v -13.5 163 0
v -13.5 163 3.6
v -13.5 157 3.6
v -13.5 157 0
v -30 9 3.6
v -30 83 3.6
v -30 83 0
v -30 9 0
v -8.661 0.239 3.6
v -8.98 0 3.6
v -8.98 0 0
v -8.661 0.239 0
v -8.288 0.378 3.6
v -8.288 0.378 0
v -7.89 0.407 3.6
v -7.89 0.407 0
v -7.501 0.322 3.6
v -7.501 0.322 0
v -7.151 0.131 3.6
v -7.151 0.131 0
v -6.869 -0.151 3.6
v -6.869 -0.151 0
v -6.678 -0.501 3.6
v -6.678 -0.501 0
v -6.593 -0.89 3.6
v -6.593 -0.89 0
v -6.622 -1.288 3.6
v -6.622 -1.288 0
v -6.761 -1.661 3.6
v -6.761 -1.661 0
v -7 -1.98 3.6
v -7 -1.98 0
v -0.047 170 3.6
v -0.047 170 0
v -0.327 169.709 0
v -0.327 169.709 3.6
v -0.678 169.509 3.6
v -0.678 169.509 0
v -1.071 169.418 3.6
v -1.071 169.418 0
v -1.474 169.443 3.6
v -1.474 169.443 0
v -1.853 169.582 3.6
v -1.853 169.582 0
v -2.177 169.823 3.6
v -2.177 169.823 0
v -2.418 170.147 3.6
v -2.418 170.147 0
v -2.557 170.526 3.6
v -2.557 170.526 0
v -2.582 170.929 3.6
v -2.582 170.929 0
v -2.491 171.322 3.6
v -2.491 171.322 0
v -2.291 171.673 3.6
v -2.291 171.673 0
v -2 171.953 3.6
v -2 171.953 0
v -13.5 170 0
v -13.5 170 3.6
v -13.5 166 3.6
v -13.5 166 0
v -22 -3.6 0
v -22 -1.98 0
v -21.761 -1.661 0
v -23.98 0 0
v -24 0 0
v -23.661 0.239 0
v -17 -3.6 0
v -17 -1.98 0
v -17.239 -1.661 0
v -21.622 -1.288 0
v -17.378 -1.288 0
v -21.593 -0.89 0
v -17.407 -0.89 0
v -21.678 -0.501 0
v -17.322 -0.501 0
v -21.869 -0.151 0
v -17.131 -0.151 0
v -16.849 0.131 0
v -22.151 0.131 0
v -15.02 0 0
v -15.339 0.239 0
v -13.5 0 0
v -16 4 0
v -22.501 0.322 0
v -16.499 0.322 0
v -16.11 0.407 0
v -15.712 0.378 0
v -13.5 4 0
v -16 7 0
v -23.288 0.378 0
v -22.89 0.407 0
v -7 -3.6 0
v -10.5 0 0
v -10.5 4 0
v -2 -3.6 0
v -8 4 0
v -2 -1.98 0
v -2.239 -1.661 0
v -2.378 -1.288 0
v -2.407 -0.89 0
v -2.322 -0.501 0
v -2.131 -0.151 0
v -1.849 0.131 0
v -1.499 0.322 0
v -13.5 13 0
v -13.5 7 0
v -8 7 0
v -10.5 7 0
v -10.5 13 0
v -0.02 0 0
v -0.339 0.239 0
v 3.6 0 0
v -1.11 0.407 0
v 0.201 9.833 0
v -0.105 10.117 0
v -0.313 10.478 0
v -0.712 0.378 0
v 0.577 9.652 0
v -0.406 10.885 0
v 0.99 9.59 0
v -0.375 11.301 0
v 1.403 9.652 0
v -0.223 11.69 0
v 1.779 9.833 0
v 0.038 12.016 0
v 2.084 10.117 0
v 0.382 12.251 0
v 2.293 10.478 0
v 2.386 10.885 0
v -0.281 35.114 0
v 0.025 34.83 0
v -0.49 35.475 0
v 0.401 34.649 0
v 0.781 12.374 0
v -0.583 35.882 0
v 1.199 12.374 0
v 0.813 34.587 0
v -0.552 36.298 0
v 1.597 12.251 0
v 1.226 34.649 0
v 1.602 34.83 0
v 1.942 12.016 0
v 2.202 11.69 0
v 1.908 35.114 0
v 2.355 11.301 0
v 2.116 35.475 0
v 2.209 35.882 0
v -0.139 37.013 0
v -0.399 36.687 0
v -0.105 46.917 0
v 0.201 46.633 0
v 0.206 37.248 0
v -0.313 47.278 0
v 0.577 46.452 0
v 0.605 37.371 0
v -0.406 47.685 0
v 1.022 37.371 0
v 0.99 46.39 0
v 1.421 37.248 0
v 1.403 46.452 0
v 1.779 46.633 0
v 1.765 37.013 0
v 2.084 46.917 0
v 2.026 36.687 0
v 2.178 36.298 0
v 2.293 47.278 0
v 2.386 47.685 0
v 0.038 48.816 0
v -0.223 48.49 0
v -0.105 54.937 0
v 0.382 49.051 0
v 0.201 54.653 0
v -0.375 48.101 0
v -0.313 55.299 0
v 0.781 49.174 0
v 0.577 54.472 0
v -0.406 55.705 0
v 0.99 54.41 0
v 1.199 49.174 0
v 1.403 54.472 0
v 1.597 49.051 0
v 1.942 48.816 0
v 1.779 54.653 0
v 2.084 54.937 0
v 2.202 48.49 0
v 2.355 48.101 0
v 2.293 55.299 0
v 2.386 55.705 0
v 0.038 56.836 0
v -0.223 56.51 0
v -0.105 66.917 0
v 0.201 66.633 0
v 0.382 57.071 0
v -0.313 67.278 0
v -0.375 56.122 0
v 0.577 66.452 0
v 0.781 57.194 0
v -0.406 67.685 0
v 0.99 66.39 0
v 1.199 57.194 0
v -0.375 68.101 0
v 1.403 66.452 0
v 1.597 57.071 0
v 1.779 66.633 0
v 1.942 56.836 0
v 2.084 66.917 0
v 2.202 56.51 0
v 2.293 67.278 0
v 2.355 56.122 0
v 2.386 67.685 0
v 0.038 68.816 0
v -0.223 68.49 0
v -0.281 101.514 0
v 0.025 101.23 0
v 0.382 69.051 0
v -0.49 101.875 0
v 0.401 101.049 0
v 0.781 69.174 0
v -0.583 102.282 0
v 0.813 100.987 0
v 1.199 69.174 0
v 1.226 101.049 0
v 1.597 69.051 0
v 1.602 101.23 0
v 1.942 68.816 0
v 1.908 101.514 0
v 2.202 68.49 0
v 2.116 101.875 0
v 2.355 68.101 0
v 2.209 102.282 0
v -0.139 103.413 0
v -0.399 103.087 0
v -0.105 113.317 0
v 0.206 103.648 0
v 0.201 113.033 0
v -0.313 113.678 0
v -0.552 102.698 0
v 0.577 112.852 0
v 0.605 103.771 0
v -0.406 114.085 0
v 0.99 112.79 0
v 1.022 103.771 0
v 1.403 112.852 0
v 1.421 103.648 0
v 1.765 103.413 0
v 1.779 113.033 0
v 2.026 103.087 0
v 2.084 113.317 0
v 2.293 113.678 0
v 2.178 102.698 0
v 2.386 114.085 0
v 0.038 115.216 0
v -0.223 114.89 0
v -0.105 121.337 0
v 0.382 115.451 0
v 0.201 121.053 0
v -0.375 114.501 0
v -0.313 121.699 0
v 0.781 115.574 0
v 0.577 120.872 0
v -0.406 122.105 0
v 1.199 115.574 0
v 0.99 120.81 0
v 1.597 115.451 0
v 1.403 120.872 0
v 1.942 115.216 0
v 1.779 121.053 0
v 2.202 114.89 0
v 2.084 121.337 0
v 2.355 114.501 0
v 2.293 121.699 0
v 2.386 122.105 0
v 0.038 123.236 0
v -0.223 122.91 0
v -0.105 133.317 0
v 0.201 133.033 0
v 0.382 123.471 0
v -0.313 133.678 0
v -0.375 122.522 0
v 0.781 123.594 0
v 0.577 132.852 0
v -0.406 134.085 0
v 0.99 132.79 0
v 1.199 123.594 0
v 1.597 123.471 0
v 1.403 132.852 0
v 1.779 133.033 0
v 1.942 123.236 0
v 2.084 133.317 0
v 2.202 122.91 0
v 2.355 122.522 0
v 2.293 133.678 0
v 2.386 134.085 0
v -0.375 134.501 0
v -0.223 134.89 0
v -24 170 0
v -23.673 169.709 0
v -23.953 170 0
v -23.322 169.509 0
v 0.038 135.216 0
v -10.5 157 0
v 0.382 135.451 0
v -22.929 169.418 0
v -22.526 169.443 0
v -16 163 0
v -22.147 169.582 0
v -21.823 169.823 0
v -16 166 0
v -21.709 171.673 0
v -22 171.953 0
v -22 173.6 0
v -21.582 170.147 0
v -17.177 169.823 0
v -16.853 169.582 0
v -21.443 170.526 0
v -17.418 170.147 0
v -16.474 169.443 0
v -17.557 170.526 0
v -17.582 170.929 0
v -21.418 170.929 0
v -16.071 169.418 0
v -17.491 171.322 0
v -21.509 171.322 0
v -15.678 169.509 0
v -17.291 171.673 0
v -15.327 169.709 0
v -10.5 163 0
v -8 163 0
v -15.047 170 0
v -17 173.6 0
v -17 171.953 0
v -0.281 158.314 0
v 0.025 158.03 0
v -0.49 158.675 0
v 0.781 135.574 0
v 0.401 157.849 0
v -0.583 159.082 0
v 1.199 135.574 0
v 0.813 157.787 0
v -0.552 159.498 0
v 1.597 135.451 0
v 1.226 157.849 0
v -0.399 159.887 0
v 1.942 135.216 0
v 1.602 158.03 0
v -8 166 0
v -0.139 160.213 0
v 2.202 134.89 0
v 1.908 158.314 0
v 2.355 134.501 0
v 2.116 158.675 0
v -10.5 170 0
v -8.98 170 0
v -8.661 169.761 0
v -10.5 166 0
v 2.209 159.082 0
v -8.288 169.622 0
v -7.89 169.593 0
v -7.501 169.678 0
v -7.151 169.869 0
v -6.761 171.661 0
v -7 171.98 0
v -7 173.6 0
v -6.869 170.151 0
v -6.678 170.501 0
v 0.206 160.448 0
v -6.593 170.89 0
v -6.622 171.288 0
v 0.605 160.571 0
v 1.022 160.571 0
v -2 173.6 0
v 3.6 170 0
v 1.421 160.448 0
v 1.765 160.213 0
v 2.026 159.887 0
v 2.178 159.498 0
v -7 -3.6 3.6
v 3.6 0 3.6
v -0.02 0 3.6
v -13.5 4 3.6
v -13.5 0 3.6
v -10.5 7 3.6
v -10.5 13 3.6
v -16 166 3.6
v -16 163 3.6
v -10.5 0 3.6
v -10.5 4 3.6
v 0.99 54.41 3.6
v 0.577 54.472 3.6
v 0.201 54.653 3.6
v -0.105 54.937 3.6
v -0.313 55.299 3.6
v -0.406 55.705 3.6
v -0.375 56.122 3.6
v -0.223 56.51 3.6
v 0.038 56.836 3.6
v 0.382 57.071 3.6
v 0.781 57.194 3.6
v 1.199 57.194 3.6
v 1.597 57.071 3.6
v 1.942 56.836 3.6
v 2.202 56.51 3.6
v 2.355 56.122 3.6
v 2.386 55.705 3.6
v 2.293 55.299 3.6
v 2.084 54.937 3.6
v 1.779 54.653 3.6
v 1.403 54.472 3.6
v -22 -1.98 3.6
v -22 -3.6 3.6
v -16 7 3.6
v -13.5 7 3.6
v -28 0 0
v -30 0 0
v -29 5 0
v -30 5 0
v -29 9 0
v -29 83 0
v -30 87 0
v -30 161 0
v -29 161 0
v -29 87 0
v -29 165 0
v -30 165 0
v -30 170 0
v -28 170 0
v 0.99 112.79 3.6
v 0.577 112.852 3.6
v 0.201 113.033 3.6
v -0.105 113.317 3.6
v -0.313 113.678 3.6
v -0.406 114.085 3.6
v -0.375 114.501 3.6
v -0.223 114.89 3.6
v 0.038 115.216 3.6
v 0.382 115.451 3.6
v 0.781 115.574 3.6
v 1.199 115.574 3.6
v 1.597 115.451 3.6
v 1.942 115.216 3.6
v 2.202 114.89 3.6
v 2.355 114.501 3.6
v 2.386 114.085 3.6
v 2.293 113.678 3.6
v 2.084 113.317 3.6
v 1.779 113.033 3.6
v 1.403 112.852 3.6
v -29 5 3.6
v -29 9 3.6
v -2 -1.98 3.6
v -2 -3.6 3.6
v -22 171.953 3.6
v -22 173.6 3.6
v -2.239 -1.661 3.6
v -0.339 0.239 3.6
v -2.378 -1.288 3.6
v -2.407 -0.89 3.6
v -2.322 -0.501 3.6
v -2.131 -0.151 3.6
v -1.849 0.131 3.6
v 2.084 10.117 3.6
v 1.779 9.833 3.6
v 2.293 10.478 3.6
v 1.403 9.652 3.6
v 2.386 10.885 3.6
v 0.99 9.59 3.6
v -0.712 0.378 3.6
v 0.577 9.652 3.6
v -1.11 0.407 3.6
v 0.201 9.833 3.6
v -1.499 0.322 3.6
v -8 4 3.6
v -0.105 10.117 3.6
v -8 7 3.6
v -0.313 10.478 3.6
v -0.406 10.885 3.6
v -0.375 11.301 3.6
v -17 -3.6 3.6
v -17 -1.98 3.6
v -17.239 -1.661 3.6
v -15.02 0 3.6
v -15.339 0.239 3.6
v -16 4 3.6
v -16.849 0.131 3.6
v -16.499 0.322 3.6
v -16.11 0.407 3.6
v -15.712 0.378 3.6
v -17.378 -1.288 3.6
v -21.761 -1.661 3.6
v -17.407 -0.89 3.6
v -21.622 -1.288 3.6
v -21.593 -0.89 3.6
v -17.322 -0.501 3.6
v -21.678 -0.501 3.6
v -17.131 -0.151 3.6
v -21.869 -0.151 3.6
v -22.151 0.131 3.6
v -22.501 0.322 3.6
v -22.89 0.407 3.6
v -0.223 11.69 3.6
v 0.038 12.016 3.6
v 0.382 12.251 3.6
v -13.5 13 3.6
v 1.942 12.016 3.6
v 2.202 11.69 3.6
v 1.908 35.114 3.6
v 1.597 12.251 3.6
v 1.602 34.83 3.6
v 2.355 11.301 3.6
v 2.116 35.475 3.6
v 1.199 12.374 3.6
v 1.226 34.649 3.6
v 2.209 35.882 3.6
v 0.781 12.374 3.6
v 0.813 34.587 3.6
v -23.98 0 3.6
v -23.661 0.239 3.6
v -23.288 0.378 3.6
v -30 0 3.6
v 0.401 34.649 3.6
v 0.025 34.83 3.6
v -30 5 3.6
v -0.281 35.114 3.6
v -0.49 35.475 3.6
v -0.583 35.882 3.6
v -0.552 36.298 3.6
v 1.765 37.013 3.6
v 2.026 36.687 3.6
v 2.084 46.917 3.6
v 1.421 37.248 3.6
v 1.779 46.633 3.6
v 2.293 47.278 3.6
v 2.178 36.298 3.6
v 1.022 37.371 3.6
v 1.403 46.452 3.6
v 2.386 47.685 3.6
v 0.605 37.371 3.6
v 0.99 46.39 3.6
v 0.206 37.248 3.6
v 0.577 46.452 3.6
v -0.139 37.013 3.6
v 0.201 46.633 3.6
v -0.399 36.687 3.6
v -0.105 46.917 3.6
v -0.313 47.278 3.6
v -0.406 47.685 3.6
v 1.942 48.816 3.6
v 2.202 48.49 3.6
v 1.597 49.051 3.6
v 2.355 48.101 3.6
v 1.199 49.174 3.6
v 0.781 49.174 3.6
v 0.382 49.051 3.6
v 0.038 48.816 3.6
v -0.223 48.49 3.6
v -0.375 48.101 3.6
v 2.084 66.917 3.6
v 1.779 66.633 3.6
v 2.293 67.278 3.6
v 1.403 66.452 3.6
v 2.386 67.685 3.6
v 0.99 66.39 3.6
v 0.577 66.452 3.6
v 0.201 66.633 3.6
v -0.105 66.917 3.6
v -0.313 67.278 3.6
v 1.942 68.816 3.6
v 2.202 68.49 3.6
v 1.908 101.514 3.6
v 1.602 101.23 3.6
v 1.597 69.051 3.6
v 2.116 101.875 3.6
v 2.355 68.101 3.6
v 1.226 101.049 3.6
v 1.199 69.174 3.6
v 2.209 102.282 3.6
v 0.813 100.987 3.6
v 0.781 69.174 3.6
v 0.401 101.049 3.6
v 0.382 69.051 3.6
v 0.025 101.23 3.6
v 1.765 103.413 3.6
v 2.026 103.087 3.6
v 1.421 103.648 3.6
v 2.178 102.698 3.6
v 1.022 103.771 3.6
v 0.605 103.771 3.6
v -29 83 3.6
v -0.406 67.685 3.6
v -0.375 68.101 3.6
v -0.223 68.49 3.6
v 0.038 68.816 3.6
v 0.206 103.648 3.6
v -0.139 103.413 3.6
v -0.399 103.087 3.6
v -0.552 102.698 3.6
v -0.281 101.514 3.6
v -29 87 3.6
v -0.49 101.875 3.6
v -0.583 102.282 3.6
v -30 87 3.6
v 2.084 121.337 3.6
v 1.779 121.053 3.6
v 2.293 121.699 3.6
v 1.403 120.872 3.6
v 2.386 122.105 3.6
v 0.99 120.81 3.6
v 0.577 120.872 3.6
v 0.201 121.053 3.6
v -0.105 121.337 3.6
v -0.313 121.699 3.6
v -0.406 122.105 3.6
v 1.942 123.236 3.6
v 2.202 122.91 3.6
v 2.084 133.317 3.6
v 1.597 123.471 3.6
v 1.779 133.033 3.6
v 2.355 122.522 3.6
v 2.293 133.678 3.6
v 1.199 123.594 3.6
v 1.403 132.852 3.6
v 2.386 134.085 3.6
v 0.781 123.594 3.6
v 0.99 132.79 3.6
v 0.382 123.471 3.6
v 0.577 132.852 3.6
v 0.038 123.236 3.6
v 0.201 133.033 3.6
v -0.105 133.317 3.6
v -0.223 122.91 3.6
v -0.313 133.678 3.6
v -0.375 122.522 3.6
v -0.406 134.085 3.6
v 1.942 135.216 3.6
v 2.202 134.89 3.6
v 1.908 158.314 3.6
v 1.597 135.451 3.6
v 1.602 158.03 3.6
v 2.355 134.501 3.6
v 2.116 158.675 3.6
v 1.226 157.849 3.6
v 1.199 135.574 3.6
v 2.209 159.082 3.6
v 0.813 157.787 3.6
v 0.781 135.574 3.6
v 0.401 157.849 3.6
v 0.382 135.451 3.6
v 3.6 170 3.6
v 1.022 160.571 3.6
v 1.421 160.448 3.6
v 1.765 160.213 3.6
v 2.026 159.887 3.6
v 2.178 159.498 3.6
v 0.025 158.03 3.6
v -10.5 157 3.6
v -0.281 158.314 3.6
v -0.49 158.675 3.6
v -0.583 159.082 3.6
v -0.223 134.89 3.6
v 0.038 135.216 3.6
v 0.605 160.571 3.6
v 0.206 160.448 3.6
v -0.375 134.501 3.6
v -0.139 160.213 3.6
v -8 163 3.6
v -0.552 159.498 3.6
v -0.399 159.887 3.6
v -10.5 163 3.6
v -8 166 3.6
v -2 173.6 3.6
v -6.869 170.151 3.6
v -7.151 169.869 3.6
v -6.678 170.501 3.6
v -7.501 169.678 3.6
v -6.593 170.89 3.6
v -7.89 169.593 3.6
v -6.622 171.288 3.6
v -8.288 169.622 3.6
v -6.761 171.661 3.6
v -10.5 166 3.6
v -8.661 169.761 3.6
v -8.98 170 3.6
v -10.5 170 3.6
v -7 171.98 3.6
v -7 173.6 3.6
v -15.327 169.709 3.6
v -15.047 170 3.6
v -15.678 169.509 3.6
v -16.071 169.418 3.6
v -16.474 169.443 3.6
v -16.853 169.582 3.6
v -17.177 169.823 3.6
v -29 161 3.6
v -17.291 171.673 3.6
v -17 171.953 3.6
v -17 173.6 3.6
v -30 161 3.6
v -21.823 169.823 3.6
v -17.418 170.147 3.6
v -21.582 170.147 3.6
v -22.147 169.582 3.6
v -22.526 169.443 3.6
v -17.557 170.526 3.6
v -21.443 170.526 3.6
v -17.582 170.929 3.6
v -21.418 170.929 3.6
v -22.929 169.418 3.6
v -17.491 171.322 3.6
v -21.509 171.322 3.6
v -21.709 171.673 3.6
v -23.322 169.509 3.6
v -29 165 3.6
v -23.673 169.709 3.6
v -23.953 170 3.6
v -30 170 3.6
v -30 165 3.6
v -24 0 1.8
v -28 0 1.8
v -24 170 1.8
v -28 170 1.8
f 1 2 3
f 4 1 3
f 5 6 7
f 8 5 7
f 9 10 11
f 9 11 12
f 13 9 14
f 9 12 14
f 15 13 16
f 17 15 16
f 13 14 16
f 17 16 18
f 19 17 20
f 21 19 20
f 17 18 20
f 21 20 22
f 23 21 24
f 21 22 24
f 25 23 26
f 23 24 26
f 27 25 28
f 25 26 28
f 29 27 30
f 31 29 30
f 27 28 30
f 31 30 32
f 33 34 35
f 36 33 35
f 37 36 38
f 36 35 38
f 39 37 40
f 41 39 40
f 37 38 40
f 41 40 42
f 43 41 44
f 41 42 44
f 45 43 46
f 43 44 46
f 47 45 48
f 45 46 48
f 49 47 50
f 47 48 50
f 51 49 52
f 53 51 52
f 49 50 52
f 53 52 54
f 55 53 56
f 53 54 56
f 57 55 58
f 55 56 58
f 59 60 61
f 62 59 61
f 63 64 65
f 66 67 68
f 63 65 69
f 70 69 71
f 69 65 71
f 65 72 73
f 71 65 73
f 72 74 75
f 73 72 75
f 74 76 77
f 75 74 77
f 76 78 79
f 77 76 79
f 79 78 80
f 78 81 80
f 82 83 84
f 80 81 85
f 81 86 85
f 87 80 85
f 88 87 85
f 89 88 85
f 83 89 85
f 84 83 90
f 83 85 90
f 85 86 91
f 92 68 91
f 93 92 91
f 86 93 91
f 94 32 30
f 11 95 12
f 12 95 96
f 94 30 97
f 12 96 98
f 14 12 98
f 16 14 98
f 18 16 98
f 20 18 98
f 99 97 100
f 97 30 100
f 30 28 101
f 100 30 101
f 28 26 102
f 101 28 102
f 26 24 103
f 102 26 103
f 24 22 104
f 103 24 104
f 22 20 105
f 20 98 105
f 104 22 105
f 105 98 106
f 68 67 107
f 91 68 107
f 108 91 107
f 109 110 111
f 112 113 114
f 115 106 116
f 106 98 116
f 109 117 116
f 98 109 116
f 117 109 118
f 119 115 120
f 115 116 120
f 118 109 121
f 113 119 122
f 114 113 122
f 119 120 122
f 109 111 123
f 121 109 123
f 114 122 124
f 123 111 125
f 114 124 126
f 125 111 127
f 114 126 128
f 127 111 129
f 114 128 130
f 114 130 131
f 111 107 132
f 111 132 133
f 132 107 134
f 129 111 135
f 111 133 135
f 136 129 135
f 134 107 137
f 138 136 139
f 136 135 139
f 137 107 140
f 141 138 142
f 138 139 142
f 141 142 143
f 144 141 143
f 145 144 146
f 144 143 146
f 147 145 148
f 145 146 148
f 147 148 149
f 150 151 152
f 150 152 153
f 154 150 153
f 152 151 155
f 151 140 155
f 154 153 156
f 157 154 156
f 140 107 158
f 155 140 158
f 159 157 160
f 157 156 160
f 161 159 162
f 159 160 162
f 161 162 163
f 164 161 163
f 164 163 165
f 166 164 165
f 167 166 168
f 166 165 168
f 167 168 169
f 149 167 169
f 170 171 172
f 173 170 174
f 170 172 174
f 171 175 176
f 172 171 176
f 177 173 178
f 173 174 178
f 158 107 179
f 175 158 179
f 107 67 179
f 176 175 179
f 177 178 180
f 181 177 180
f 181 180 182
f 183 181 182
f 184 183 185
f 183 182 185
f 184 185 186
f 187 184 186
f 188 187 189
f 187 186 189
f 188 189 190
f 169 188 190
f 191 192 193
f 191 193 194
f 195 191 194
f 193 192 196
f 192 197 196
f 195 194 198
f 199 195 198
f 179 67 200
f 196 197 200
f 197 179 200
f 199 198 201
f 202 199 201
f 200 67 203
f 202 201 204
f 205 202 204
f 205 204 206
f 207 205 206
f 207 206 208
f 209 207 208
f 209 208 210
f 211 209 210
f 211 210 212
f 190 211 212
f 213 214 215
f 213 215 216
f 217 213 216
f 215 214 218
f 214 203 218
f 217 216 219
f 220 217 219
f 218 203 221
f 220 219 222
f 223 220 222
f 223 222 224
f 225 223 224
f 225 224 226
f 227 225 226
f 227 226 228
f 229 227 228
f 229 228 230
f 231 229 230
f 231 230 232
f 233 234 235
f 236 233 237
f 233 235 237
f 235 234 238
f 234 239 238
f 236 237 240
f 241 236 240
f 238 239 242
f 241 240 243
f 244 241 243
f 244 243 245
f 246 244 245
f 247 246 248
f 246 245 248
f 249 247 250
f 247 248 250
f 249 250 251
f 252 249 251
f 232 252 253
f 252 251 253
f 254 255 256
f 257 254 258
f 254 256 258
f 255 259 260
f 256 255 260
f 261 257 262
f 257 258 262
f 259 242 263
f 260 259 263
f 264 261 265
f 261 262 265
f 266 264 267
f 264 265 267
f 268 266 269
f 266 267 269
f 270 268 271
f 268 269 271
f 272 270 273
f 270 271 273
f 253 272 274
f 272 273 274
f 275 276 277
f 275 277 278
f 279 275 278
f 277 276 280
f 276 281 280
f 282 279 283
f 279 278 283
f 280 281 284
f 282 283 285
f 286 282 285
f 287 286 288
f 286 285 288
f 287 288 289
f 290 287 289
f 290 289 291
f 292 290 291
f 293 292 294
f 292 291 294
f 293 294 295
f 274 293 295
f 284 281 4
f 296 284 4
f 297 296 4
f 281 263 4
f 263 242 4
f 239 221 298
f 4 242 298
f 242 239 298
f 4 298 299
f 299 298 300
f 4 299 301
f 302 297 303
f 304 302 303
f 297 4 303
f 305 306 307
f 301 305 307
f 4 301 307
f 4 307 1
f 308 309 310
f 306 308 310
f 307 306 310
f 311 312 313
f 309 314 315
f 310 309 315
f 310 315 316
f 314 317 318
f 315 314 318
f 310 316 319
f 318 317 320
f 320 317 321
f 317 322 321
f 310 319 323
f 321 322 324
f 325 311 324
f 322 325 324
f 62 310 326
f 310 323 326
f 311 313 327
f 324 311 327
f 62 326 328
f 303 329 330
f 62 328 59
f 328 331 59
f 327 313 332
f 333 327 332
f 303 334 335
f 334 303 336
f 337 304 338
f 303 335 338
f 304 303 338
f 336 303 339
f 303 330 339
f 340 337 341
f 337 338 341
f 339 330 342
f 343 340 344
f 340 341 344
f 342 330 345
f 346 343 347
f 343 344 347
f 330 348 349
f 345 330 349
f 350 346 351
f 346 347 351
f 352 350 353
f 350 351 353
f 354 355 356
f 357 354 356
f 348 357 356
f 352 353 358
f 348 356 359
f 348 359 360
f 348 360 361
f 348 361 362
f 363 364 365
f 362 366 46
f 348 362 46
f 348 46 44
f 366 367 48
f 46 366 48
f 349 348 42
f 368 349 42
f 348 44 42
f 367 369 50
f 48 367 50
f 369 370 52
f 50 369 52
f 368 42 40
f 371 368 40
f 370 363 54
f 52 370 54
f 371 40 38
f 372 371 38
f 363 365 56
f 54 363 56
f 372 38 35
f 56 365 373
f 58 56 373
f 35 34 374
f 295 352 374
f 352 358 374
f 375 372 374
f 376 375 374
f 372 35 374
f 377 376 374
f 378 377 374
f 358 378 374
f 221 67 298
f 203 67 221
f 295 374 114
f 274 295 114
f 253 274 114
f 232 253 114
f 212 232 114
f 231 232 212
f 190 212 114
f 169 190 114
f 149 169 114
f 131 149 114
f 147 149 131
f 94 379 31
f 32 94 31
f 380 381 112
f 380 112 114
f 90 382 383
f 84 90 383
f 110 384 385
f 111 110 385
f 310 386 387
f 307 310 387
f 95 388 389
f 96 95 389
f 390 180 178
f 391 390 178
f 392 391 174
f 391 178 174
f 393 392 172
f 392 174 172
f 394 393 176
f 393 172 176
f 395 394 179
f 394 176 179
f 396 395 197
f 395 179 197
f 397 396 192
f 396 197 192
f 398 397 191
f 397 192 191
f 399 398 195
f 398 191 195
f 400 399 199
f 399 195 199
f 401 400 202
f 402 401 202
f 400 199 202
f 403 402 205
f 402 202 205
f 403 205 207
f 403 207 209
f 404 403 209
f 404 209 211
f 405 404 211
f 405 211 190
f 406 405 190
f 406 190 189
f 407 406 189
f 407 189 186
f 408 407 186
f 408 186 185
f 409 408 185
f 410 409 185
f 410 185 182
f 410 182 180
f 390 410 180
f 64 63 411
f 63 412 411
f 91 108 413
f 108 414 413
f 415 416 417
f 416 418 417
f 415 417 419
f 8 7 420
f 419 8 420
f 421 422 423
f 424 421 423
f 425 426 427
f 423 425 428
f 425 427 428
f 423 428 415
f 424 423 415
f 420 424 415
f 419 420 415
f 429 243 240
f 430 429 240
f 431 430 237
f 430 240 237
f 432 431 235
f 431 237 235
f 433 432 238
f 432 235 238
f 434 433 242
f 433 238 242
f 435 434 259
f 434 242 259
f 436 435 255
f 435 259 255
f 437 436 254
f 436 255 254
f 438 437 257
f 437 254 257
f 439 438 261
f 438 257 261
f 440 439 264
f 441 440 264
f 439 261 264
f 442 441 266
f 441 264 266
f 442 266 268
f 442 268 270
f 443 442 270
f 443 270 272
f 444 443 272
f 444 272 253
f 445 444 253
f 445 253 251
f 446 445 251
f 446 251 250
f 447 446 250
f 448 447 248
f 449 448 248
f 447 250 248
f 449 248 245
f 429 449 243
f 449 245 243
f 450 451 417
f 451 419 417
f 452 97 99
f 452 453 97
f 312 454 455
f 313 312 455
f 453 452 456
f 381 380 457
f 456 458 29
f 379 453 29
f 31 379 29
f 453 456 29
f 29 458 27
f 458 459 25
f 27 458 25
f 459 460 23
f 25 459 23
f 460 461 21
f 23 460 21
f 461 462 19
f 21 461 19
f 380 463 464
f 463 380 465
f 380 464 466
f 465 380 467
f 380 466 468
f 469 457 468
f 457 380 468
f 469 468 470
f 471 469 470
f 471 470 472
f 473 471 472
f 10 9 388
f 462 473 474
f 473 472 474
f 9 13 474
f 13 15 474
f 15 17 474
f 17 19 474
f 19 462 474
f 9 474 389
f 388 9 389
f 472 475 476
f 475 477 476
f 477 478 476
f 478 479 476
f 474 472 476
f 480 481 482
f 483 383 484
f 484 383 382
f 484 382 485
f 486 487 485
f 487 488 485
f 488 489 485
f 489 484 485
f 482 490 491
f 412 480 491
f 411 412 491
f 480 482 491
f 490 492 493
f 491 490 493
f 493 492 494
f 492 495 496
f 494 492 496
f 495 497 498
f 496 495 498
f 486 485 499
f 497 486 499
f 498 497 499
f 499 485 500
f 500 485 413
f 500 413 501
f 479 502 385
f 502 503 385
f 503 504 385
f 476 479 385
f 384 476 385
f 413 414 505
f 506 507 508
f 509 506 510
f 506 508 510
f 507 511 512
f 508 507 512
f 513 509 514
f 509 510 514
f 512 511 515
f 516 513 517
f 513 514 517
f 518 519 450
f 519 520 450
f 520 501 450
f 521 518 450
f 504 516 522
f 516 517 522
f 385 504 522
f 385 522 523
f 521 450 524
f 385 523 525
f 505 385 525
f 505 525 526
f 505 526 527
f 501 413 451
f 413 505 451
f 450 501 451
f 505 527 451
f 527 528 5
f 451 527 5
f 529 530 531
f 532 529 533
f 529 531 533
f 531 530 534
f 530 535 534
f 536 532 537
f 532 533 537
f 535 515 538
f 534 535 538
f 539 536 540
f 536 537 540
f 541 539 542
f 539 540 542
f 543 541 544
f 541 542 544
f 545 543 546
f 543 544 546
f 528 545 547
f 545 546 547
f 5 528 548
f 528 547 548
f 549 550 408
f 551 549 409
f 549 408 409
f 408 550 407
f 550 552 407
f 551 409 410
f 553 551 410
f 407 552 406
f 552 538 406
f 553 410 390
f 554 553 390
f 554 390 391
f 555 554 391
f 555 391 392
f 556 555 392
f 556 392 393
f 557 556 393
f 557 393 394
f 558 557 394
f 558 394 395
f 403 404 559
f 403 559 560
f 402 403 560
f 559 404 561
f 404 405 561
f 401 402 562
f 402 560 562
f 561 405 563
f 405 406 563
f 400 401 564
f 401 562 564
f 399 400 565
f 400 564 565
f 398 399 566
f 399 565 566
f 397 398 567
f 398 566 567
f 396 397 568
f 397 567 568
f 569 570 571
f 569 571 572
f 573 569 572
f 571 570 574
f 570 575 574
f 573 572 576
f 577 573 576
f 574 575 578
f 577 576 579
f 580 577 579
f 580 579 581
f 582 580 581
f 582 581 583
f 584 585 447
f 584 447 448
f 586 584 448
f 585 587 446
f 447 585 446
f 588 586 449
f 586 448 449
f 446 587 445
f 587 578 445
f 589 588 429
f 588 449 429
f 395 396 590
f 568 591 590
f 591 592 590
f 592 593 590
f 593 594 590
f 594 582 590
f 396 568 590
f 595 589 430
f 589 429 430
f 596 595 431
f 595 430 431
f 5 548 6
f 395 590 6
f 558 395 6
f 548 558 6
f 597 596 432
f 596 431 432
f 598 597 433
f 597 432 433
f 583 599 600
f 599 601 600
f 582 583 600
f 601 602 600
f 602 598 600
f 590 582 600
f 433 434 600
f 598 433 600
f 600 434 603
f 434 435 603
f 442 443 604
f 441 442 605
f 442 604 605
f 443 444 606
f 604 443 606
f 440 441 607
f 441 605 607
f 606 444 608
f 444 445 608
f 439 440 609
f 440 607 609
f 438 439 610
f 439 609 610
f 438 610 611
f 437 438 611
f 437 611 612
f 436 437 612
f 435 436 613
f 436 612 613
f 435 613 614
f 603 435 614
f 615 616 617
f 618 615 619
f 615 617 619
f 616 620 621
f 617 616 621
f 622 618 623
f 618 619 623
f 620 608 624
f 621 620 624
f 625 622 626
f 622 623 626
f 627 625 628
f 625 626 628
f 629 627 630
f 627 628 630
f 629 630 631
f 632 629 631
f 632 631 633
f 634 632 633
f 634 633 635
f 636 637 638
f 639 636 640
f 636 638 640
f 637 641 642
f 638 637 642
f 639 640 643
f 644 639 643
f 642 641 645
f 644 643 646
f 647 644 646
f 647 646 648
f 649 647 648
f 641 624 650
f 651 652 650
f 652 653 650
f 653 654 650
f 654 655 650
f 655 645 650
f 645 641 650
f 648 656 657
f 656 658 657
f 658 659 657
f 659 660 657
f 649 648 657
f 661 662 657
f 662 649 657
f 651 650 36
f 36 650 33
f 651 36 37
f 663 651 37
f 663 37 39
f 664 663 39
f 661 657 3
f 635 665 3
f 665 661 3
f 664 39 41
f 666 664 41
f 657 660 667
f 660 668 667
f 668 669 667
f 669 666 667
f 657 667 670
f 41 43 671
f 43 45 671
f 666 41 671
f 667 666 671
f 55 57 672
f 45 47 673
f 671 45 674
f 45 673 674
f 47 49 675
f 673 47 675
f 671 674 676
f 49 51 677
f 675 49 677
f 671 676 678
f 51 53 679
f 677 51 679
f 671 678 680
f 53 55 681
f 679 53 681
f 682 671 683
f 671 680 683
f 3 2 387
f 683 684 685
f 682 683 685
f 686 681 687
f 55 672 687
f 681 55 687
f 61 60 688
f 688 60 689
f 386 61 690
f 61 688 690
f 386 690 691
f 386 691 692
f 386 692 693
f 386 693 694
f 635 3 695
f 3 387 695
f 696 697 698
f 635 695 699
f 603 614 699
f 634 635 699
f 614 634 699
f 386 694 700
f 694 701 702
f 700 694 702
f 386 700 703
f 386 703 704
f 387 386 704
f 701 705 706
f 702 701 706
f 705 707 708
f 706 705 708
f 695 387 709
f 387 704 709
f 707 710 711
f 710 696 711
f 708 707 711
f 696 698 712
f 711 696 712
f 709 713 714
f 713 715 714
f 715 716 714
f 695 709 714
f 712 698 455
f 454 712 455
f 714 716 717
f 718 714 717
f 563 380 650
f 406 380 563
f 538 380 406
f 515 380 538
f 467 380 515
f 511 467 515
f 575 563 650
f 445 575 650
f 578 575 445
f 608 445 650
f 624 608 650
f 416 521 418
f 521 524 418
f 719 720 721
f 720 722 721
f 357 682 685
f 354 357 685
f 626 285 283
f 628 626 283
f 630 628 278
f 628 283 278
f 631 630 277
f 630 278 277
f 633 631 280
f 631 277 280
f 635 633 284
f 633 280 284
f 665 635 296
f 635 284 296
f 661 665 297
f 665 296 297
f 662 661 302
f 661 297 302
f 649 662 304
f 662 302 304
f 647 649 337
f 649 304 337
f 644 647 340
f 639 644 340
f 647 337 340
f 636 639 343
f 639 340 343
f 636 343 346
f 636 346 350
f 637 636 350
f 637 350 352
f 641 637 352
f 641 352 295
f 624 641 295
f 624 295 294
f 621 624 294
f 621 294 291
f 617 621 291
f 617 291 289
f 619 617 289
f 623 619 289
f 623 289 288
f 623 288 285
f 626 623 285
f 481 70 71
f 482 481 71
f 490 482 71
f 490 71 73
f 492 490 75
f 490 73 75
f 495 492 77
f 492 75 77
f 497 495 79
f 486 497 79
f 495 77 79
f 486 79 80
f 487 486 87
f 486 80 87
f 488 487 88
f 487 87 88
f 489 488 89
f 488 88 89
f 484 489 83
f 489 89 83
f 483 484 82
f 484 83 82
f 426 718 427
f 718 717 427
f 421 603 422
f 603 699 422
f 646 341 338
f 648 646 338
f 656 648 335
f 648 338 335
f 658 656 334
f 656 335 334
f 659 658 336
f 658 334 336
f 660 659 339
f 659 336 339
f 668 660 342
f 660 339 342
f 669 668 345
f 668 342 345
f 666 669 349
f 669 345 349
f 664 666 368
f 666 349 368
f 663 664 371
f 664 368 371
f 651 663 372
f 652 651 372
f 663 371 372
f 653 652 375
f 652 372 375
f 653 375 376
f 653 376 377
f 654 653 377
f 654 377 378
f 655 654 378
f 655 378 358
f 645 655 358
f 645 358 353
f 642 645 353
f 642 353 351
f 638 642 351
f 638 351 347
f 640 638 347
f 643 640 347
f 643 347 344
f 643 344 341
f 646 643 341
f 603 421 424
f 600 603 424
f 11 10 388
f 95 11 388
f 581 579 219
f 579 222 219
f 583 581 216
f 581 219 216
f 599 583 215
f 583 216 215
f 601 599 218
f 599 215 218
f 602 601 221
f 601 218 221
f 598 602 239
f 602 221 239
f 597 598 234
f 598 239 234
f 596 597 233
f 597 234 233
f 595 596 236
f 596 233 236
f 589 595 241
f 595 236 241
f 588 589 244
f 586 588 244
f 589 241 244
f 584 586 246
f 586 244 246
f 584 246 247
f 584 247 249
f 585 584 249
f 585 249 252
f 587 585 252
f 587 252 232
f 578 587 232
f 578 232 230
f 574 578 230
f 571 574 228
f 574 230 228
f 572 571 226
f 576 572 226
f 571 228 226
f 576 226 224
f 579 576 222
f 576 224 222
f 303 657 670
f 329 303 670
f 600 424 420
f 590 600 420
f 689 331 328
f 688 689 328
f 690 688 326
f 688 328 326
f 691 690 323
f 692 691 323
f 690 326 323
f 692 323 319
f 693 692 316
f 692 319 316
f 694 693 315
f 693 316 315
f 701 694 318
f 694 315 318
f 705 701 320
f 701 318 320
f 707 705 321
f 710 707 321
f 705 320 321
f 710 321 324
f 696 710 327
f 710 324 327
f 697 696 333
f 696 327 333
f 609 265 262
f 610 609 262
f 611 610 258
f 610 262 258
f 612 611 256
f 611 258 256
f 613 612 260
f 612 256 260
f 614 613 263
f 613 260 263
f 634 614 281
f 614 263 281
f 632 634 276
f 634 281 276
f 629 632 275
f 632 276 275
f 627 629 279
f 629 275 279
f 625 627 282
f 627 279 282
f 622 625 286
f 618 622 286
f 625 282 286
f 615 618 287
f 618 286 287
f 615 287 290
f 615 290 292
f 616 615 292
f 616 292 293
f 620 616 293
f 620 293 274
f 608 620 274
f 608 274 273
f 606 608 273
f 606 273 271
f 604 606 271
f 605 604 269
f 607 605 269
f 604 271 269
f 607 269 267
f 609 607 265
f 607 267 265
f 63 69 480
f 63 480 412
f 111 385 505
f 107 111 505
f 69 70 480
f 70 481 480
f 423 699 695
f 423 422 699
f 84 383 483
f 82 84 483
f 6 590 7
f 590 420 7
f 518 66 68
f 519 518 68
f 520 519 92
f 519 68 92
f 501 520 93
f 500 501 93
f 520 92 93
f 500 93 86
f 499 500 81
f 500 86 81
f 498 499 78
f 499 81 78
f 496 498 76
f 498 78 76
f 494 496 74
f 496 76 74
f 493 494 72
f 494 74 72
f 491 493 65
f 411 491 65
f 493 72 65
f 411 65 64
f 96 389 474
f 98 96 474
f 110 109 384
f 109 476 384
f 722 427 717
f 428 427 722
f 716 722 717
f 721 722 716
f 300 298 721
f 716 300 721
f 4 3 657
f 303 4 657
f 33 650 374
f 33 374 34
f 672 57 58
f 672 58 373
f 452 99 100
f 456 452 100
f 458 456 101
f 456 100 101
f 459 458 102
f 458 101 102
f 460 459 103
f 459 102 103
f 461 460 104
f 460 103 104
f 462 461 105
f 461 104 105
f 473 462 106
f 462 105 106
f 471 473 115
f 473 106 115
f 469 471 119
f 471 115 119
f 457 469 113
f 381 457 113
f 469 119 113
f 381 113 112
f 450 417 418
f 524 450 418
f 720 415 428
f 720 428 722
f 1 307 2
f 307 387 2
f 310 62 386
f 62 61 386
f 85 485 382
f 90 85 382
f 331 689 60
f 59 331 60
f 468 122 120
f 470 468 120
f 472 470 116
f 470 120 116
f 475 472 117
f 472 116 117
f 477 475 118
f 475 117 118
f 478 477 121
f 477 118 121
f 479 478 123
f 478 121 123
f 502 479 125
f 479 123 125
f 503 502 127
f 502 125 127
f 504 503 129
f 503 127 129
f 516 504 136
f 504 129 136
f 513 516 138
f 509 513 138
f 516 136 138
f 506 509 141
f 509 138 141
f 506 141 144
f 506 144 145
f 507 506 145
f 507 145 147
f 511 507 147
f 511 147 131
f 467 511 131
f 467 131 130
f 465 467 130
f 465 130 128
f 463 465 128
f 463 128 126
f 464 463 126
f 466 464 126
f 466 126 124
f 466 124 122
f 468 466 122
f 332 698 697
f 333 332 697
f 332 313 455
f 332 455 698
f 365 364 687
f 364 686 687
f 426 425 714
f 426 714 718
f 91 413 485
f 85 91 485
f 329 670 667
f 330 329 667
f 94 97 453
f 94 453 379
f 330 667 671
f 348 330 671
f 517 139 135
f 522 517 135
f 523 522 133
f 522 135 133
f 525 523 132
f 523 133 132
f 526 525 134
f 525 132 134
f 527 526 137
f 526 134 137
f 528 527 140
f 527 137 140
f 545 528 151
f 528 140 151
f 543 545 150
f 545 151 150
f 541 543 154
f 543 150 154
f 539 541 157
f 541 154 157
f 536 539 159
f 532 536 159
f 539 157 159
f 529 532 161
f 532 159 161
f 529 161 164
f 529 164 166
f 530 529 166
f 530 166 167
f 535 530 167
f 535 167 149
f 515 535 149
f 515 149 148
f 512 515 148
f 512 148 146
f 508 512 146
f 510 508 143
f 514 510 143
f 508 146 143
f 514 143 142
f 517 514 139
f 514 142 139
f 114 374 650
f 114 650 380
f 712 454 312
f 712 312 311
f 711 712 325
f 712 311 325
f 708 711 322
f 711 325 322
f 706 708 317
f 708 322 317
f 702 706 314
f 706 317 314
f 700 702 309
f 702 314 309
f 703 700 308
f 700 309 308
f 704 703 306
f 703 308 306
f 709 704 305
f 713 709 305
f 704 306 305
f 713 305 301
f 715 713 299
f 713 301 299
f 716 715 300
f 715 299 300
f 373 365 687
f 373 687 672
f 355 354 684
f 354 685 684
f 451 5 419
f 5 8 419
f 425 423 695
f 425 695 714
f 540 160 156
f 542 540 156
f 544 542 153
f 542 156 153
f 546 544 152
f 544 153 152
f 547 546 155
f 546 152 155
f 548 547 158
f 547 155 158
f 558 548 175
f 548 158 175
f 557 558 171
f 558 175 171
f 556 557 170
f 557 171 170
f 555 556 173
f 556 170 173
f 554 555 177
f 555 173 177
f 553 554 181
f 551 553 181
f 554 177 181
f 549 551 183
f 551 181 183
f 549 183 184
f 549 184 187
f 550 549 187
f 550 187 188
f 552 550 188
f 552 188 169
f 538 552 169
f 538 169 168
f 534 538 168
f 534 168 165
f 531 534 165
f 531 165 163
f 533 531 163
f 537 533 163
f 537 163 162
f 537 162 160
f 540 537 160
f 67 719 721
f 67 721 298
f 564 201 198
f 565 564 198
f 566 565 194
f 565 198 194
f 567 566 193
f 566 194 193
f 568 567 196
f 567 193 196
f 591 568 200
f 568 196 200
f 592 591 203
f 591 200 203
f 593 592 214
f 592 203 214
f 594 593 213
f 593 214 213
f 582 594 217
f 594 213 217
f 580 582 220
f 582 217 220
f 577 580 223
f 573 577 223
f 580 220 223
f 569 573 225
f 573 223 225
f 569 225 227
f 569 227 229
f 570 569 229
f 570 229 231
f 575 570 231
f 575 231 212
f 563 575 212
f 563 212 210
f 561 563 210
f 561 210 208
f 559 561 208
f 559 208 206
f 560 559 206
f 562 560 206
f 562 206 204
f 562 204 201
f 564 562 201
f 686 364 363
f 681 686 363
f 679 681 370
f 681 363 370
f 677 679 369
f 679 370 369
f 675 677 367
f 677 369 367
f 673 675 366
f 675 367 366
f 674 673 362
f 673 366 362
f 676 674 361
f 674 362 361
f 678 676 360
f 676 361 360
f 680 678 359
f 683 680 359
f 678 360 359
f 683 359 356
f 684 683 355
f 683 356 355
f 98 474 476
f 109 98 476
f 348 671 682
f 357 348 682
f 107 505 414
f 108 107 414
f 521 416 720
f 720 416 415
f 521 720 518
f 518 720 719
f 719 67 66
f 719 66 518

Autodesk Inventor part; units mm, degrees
ref_plane "YZ Plane" through (0, 0, 0) normal (1, 0, 0) x (0, 1, 0)
ref_plane "XZ Plane" through (0, 0, 0) normal (0, 1, 0) x (-1, 0, 0)
ref_plane "XY Plane" through (0, 0, 0) normal (0, 0, 1) x (1, 0, 0)
ref_plane "Work Plane1" through (0, 0, 0) normal (0, 0, 1) x (1, 0, 0)
sketch "Sketch1" plane through (0, 0, 0) normal (0, 0, 1) x (1, 0, 0)
  line L0 (0, 0) -> (0, 170) projected
  line L1 (0, 170) -> (-24, 170) projected
  line L2 (-24, 0) -> (-24, 170) projected
  line L3 (0, 0) -> (-24, 0) projected
  line L4 (-27.6, 173.6) -> (3.6, 173.6)
  line L5 (3.6, 173.6) -> (3.6, -3.6)
  line L6 (3.6, -3.6) -> (-27.6, -3.6)
  line L7 (-27.6, -3.6) -> (-27.6, 173.6)
  line L8 (3.6, 10) -> (3.6, -1.8) projected
  line L9 (0, 10) -> (3.6, 10) projected
  line L10 (0, 0) -> (0, 10) projected
  line L11 (0, -1.8) -> (3.6, -1.8) projected
  line L12 (3.6, 46.8) -> (3.6, 36.8) projected
  line L13 (0, 36.8) -> (0, 46.8) projected
  line L14 (3.6, 66.8) -> (3.6, 56.8) projected
  line L15 (0, 56.8) -> (0, 66.8) projected
  line L16 (3.6, 113.2) -> (3.6, 103.2) projected
  line L17 (0, 103.2) -> (0, 113.2) projected
  line L18 (3.6, 133.2) -> (3.6, 123.2) projected
  line L19 (0, 123.2) -> (0, 133.2) projected
  line L20 (3.6, 170) -> (3.6, 160)
  line L21 (0, 170) -> (3.6, 170)
  line L22 (0, 160) -> (0, 170)
  line L23 (0, 160) -> (3.6, 160)
  line L24 (0, 46.8) -> (3.6, 46.8) projected
  line L25 (0, 36.8) -> (3.6, 36.8) projected
  line L26 (0, 66.8) -> (3.6, 66.8) projected
  line L27 (0, 56.8) -> (3.6, 56.8) projected
  line L28 (0, 113.2) -> (3.6, 113.2) projected
  line L29 (0, 103.2) -> (3.6, 103.2) projected
  line L30 (0, 133.2) -> (3.6, 133.2) projected
  line L31 (0, 123.2) -> (3.6, 123.2) projected
  point P0 (3.6, 131.2201)
  point P1 (3.6, 125.1799)
  point P2 (0, 125.1799)
  point P3 (0, 131.2201)
  dimension "d0" = 3.6
extrude "Extrusion1" add sketch "Sketch1" along normal blind 3.6
sketch "Sketch2" plane through (0, 0, 3.6) normal (0, 0, 1) x (1, 0, 0)
  line L0 (3.6, -3.6) -> (3.6, 173.6) projected
  line L1 (3.6, 173.6) -> (-27.6, 173.6) projected
  line L2 (-27.6, 173.6) -> (-27.6, -3.6) projected
  line L3 (-27.6, -3.6) -> (3.6, -3.6) projected
  line L4 (-17, -3.6) -> (-7, -3.6)
  line L5 (-7, -3.6) -> (-7, 0)
  line L6 (-7, 0) -> (-17, 0)
  line L7 (-17, 0) -> (-17, -3.6)
  line L8 (-17, -3.6) -> (-22, -3.6)
  line L9 (-22, -3.6) -> (-22, 0)
  line L10 (-22, 0) -> (-17, 0)
  line L11 (-17, 0) -> (-17, -3.6)
  line L12 (-7, -3.6) -> (-2, -3.6)
  line L13 (-2, -3.6) -> (-2, 0)
  line L14 (-2, 0) -> (-7, 0)
  line L15 (-7, 0) -> (-7, -3.6)
  line L16 (-22, 0) -> (-27.6, 0)
  line L17 (-27.6, 0) -> (-27.6, -3.6)
  line L18 (-27.6, -3.6) -> (-22, -3.6)
  line L19 (-22, -3.6) -> (-22, 0)
  line L20 (-27.6, -3.6) -> (3.6, -3.6) projected
  line L21 (-2, 0) -> (3.6, 0)
  line L22 (3.6, 0) -> (3.6, -3.6)
  line L23 (3.6, -3.6) -> (-2, -3.6)
  line L24 (-2, -3.6) -> (-2, 0)
  line L25 (-13.5, -13) -> (-10.5, -13)
  line L26 (-10.5, -13) -> (-10.5, 13)
  line L27 (-10.5, 13) -> (-13.5, 13)
  line L28 (-13.5, 13) -> (-13.5, -13)
  line L29 (-13.5, -13) -> (-10.5, 13) construction
  line L30 (-10.5, -13) -> (-13.5, 13) construction
  line L31 (-16, 4) -> (-8, 4)
  line L32 (-8, 4) -> (-8, 7)
  line L33 (-8, 7) -> (-16, 7)
  line L34 (-16, 7) -> (-16, 4)
  line L35 (-16, 4) -> (-8, 7) construction
  line L36 (-8, 4) -> (-16, 7) construction
  line L37 (-12, 13) -> (-12, 0) construction
  point P0 (0, 0)
  point P1 (-12, 5.5)
  point P2 (-12, 5.5)
  point P3 (-13.5, 4)
  point P4 (-13.5, 0)
  point P5 (-10.5, 0)
  point P6 (-10.5, 4)
  point P7 (-10.5, 7)
  point P8 (-13.5, 7)
  dimension "d3" = 10
  dimension "d4" = 3.6
  dimension "d5" = 10.6
  dimension "d7" = 5
  dimension "d8" = 5
  dimension "d9" = 3
  dimension "d10" = 26
  dimension "d11" = 8
  dimension "d12" = 3
  dimension "d14" = 4
extrude "Extrusion2" cut sketch "Sketch2" against normal blind 3.6 contours L3 L13 L21 L0 | L3 L26 L6 L5 | L3 L28 L6 L26 | L16 L9 L3 L2 | L6 L28 L31 L26 | L3 L7 L6 L28 | L31 L28 L33 L26 | L26 L33 L32 L31 | L31 L34 L33 L28 | L33 L28 L27 L26
ref_plane "Work Plane2" through (-22, 85, 0) normal (0, -1, 0) x (1, 0, 0)
mirror "Mirror1" about plane through (-22, 85, 0) normal (0, -1, 0) of "Extrusion2"
sketch "Sketch3" plane through (-27.6, 170, 3.6) normal (0, 1, 0) x (1, 0, 0)
  line L0 (27.6, 3.6) -> (27.6, 73.6) projected
  line L1 (27.6, 73.6) -> (3.6, 73.6) projected
  line L2 (3.6, 3.6) -> (3.6, 73.6) projected
  line L3 (27.6, 3.6) -> (3.6, 3.6) projected
  line L4 (5.6, 0) -> (0, 0) projected
  line L5 (5.6, 0) -> (5.6, 3.6) projected
  line L6 (0, 3.6) -> (5.6, 3.6) projected
  line L7 (0, 0) -> (0, 3.6) projected
  line L8 (0, 3.6) -> (0, 0) projected
  line L9 (3.6, 3.6) -> (0, 3.6)
  line L10 (0, 3.6) -> (0, 1.8)
  line L11 (0, 1.8) -> (3.6, 1.8)
  line L12 (3.6, 1.8) -> (3.6, 3.6)
  line L13 (0, 0) -> (-2.4, 0)
  line L14 (-2.4, 0) -> (-2.4, 3.6)
  line L15 (-2.4, 3.6) -> (0, 3.6)
  line L16 (0, 3.6) -> (0, 0)
  dimension "d17" = 2.4
extrude "Extrusion3" add sketch "Sketch3" against normal up to surface (170 mm away) contours L7 L13 L14 L15
sketch "Sketch4" plane through (-22, 170, 3.6) normal (0, 1, 0) x (1, 0, 0)
  line L0 (-8, 0) -> (0, 0) projected
  line L1 (0, 0) -> (0, 3.6) projected
  line L2 (-8, 3.6) -> (0, 3.6) projected
  line L3 (-8, 3.6) -> (-8, 0) projected
  line L4 (22, 3.6) -> (22, 73.6) projected
  line L5 (22, 73.6) -> (-2, 73.6) projected
  line L6 (-2, 3.6) -> (-2, 73.6) projected
  line L7 (22, 3.6) -> (-2, 3.6) projected
  line L8 (-2, 3.6) -> (-6, 3.6)
  line L9 (-6, 3.6) -> (-6, 1.8)
  line L10 (-6, 1.8) -> (-2, 1.8)
  line L11 (-2, 1.8) -> (-2, 3.6)
  point P0 (-6, 3.6)
  dimension "d20" = 4
  dimension "d21" = 1.8
extrude "Extrusion4" cut sketch "Sketch4" against normal through all contours L2 L11 L10 L9
sketch "Sketch5" plane through (0, 0, 0) normal (0, 0, -1) x (-1, 0, 0)
  line L0 (28, 170) -> (28, 0) projected
  line L1 (28, 0) -> (30, 0) projected
  line L2 (30, 170) -> (30, 0) projected
  line L3 (30, 170) -> (28, 170) projected
  line L4 (29, 83) -> (31, 83)
  line L5 (31, 83) -> (31, 87)
  line L6 (31, 87) -> (29, 87)
  line L7 (29, 87) -> (29, 83)
  line L8 (30, 170) -> (30, 0) projected
  line L9 (29, 83) -> (31, 87) construction
  line L10 (31, 83) -> (29, 87) construction
  line L11 (29, 165) -> (31, 165)
  line L12 (31, 165) -> (31, 161)
  line L13 (31, 161) -> (29, 161)
  line L14 (29, 161) -> (29, 165)
  line L15 (30, 170) -> (30, 0) projected
  line L16 (29, 165) -> (31, 161) construction
  line L17 (31, 165) -> (29, 161) construction
  line L18 (30, 85) -> (40.6182, 85) construction
  line L19 (30, 0) -> (28, 0)
  line L20 (29, 5) -> (31, 5)
  line L21 (31, 5) -> (31, 9)
  line L22 (31, 9) -> (29, 9)
  line L23 (29, 9) -> (29, 5)
  line L24 (29, 5) -> (31, 9) construction
  line L25 (31, 5) -> (29, 9) construction
  point P0 (0, 0)
  point P1 (30, 163)
  point P2 (30, 7)
  point P3 (30, 5)
  point P4 (30, 9)
  point P5 (30, 83)
  point P6 (30, 87)
  point P7 (30, 161)
  point P8 (30, 165)
  dimension "d24" = 2
  dimension "d25" = 4
  dimension "d26" = 4
  dimension "d27" = 5
extrude "Extrusion5" cut sketch "Sketch5" against normal through all contours L2 L13 L14 L11 | L20 L23 L22 L2 | L2 L4 L7 L6
sketch "Sketch6" plane through (0, 0, 3.6) normal (0, 0, 1) x (1, 0, 0)
  line L0 (-29, 5) -> (-30, 5) projected
  line L1 (-30, 5) -> (-30, 0) projected
  line L2 (-22, 0) -> (-30, 0) projected
  line L3 (-22, 0) -> (-22, -3.6) projected
  line L4 (-22, -3.6) -> (-17, -3.6) projected
  line L5 (-17, -3.6) -> (-17, 0) projected
  line L6 (-17, 0) -> (-13.5, 0) projected
  line L7 (-13.5, 0) -> (-13.5, 4) projected
  line L8 (-13.5, 4) -> (-16, 4) projected
  line L9 (-16, 4) -> (-16, 7) projected
  line L10 (-16, 7) -> (-13.5, 7) projected
  line L11 (-13.5, 7) -> (-13.5, 13) projected
  line L12 (-13.5, 13) -> (-10.5, 13) projected
  line L13 (-10.5, 13) -> (-10.5, 7) projected
  line L14 (-10.5, 7) -> (-8, 7) projected
  line L15 (-8, 7) -> (-8, 4) projected
  line L16 (-8, 4) -> (-10.5, 4) projected
  line L17 (-10.5, 4) -> (-10.5, 0) projected
  line L18 (-10.5, 0) -> (-7, 0) projected
  line L19 (-7, 0) -> (-7, -3.6) projected
  line L20 (-7, -3.6) -> (-2, -3.6) projected
  line L21 (-2, -3.6) -> (-2, 0) projected
  line L22 (-2, 0) -> (3.6, 0) projected
  line L23 (3.6, 0) -> (3.6, 170) projected
  line L24 (3.6, 170) -> (-2, 170) projected
  line L25 (-2, 170) -> (-2, 173.6) projected
  line L26 (-2, 173.6) -> (-7, 173.6) projected
  line L27 (-7, 173.6) -> (-7, 170) projected
  line L28 (-7, 170) -> (-10.5, 170) projected
  line L29 (-10.5, 170) -> (-10.5, 166) projected
  line L30 (-10.5, 166) -> (-8, 166) projected
  line L31 (-8, 166) -> (-8, 163) projected
  line L32 (-8, 163) -> (-10.5, 163) projected
  line L33 (-10.5, 163) -> (-10.5, 157) projected
  line L34 (-10.5, 157) -> (-13.5, 157) projected
  line L35 (-13.5, 157) -> (-13.5, 163) projected
  line L36 (-13.5, 163) -> (-16, 163) projected
  line L37 (-16, 163) -> (-16, 166) projected
  line L38 (-16, 166) -> (-13.5, 166) projected
  line L39 (-13.5, 166) -> (-13.5, 170) projected
  line L40 (-13.5, 170) -> (-17, 170) projected
  line L41 (-17, 170) -> (-17, 173.6) projected
  line L42 (-17, 173.6) -> (-22, 173.6) projected
  line L43 (-22, 173.6) -> (-22, 170) projected
  line L44 (-30, 170) -> (-22, 170) projected
  line L45 (-30, 170) -> (-30, 165) projected
  line L46 (-30, 165) -> (-29, 165) projected
  line L47 (-29, 165) -> (-29, 161) projected
  line L48 (-29, 161) -> (-30, 161) projected
  line L49 (-30, 161) -> (-30, 87) projected
  line L50 (-30, 87) -> (-29, 87) projected
  line L51 (-29, 87) -> (-29, 83) projected
  line L52 (-29, 83) -> (-30, 83) projected
  line L53 (-30, 83) -> (-30, 9) projected
  line L54 (-30, 9) -> (-29, 9) projected
  line L55 (-29, 9) -> (-29, 5) projected
  circle A0 centre (-28.3256, -9.1766) radius 1.4 construction
  line L56 (-29.3156, -10.1665) -> (-27.3357, -10.1665) construction
  line L57 (-27.3357, -10.1665) -> (-27.3357, -8.1866) construction
  line L58 (-27.3357, -8.1866) -> (-29.3156, -8.1866) construction
  line L59 (-29.3156, -8.1866) -> (-29.3156, -10.1665) construction
  line L60 (-29.3156, -10.1665) -> (-27.3357, -8.1866) construction
  line L61 (-27.3357, -10.1665) -> (-29.3156, -8.1866) construction
  line L62 (-21.0101, 0.9899) -> (-22.9899, 0.9899)
  line L63 (-22.9899, 0.9899) -> (-22.9899, -0.9899)
  line L64 (-22.9899, -0.9899) -> (-21.0101, -0.9899)
  line L65 (-21.0101, -0.9899) -> (-21.0101, 0.9899)
  line L66 (-22, 0) -> (-24, 0) projected
  line L67 (-21.0101, 0.9899) -> (-22.9899, -0.9899) construction
  line L68 (-22.9899, 0.9899) -> (-21.0101, -0.9899) construction
  line L69 (-17.9899, 0.9899) -> (-16.0101, 0.9899)
  line L70 (-16.0101, 0.9899) -> (-16.0101, -0.9899)
  line L71 (-16.0101, -0.9899) -> (-17.9899, -0.9899)
  line L72 (-17.9899, -0.9899) -> (-17.9899, 0.9899)
  line L73 (-17, 0) -> (-17, -3.6) projected
  line L74 (-17.9899, 0.9899) -> (-16.0101, -0.9899) construction
  line L75 (-16.0101, 0.9899) -> (-17.9899, -0.9899) construction
  line L76 (-6.0101, 0.9899) -> (-7.9899, 0.9899)
  line L77 (-7.9899, 0.9899) -> (-7.9899, -0.9899)
  line L78 (-7.9899, -0.9899) -> (-6.0101, -0.9899)
  line L79 (-6.0101, -0.9899) -> (-6.0101, 0.9899)
  line L80 (-6.0101, 0.9899) -> (-7.9899, -0.9899) construction
  line L81 (-7.9899, 0.9899) -> (-6.0101, -0.9899) construction
  line L82 (-2.9899, 0.9899) -> (-1.0101, 0.9899)
  line L83 (-1.0101, 0.9899) -> (-1.0101, -0.9899)
  line L84 (-1.0101, -0.9899) -> (-2.9899, -0.9899)
  line L85 (-2.9899, -0.9899) -> (-2.9899, 0.9899)
  line L86 (3.6, 0) -> (-2, 0) projected
  line L87 (-2.9899, 0.9899) -> (-1.0101, -0.9899) construction
  line L88 (-1.0101, 0.9899) -> (-2.9899, -0.9899) construction
  line L89 (-0.9899, 9.0101) -> (0.9899, 9.0101)
  line L90 (0.9899, 9.0101) -> (0.9899, 10.9899)
  line L91 (0.9899, 10.9899) -> (-0.9899, 10.9899)
  line L92 (-0.9899, 10.9899) -> (-0.9899, 9.0101)
  line L93 (-0.9899, 9.0101) -> (0.9899, 10.9899) construction
  line L94 (0.9899, 9.0101) -> (-0.9899, 10.9899) construction
  line L95 (-0.9899, 37.7899) -> (0.9899, 37.7899)
  line L96 (0.9899, 37.7899) -> (0.9899, 35.8101)
  line L97 (0.9899, 35.8101) -> (-0.9899, 35.8101)
  line L98 (-0.9899, 35.8101) -> (-0.9899, 37.7899)
  line L99 (-0.9899, 37.7899) -> (0.9899, 35.8101) construction
  line L100 (0.9899, 37.7899) -> (-0.9899, 35.8101) construction
  line L101 (-0.9899, 65.8101) -> (0.9899, 65.8101)
  line L102 (0.9899, 65.8101) -> (0.9899, 67.7899)
  line L103 (0.9899, 67.7899) -> (-0.9899, 67.7899)
  line L104 (-0.9899, 67.7899) -> (-0.9899, 65.8101)
  line L105 (0, 66.8) -> (0, 103.2) projected
  line L106 (-0.9899, 65.8101) -> (0.9899, 67.7899) construction
  line L107 (0.9899, 65.8101) -> (-0.9899, 67.7899) construction
  line L108 (-0.9899, 104.1899) -> (0.9899, 104.1899)
  line L109 (0.9899, 104.1899) -> (0.9899, 102.2101)
  line L110 (0.9899, 102.2101) -> (-0.9899, 102.2101)
  line L111 (-0.9899, 102.2101) -> (-0.9899, 104.1899)
  line L112 (-0.9899, 104.1899) -> (0.9899, 102.2101) construction
  line L113 (0.9899, 104.1899) -> (-0.9899, 102.2101) construction
  line L114 (-0.9899, 112.2101) -> (0.9899, 112.2101)
  line L115 (0.9899, 112.2101) -> (0.9899, 114.1899)
  line L116 (0.9899, 114.1899) -> (-0.9899, 114.1899)
  line L117 (-0.9899, 114.1899) -> (-0.9899, 112.2101)
  line L118 (3.6, 113.2) -> (0, 113.2) projected
  line L119 (-0.9899, 112.2101) -> (0.9899, 114.1899) construction
  line L120 (0.9899, 112.2101) -> (-0.9899, 114.1899) construction
  line L121 (-0.9899, 124.1899) -> (0.9899, 124.1899)
  line L122 (0.9899, 124.1899) -> (0.9899, 122.2101)
  line L123 (0.9899, 122.2101) -> (-0.9899, 122.2101)
  line L124 (-0.9899, 122.2101) -> (-0.9899, 124.1899)
  line L125 (0, 123.2) -> (3.6, 123.2) projected
  line L126 (-0.9899, 124.1899) -> (0.9899, 122.2101) construction
  line L127 (0.9899, 124.1899) -> (-0.9899, 122.2101) construction
  line L128 (-0.9899, 132.2101) -> (0.9899, 132.2101)
  line L129 (0.9899, 132.2101) -> (0.9899, 134.1899)
  line L130 (0.9899, 134.1899) -> (-0.9899, 134.1899)
  line L131 (-0.9899, 134.1899) -> (-0.9899, 132.2101)
  line L132 (3.6, 133.2) -> (0, 133.2) projected
  line L133 (-0.9899, 132.2101) -> (0.9899, 134.1899) construction
  line L134 (0.9899, 132.2101) -> (-0.9899, 134.1899) construction
  line L135 (-0.9899, 160.9899) -> (0.9899, 160.9899)
  line L136 (0.9899, 160.9899) -> (0.9899, 159.0101)
  line L137 (0.9899, 159.0101) -> (-0.9899, 159.0101)
  line L138 (-0.9899, 159.0101) -> (-0.9899, 160.9899)
  line L139 (0, 133.2) -> (0, 160) projected
  line L140 (-0.9899, 160.9899) -> (0.9899, 159.0101) construction
  line L141 (0.9899, 160.9899) -> (-0.9899, 159.0101) construction
  line L142 (-7.9899, 170.9899) -> (-6.0101, 170.9899)
  line L143 (-6.0101, 170.9899) -> (-6.0101, 169.0101)
  line L144 (-6.0101, 169.0101) -> (-7.9899, 169.0101)
  line L145 (-7.9899, 169.0101) -> (-7.9899, 170.9899)
  line L146 (-7.9899, 170.9899) -> (-6.0101, 169.0101) construction
  line L147 (-6.0101, 170.9899) -> (-7.9899, 169.0101) construction
  line L148 (-1.1868, 170.8132) -> (-2.8132, 170.8132)
  line L149 (-2.8132, 170.8132) -> (-2.8132, 169.1868)
  line L150 (-2.8132, 169.1868) -> (-1.1868, 169.1868)
  line L151 (-1.1868, 169.1868) -> (-1.1868, 170.8132)
  line L152 (-1.1868, 170.8132) -> (-2.8132, 169.1868) construction
  line L153 (-2.8132, 170.8132) -> (-1.1868, 169.1868) construction
  line L154 (-17.8132, 170.8132) -> (-16.1868, 170.8132)
  line L155 (-16.1868, 170.8132) -> (-16.1868, 169.1868)
  line L156 (-16.1868, 169.1868) -> (-17.8132, 169.1868)
  line L157 (-17.8132, 169.1868) -> (-17.8132, 170.8132)
  line L158 (-17.8132, 170.8132) -> (-16.1868, 169.1868) construction
  line L159 (-16.1868, 170.8132) -> (-17.8132, 169.1868) construction
  line L160 (-22.8132, 170.8132) -> (-21.1868, 170.8132)
  line L161 (-21.1868, 170.8132) -> (-21.1868, 169.1868)
  line L162 (-21.1868, 169.1868) -> (-22.8132, 169.1868)
  line L163 (-22.8132, 169.1868) -> (-22.8132, 170.8132)
  line L164 (-22.8132, 170.8132) -> (-21.1868, 169.1868) construction
  line L165 (-21.1868, 170.8132) -> (-22.8132, 169.1868) construction
  line L166 (-0.9899, 57.7899) -> (0.9899, 57.7899)
  line L167 (0.9899, 57.7899) -> (0.9899, 55.8101)
  line L168 (0.9899, 55.8101) -> (-0.9899, 55.8101)
  line L169 (-0.9899, 55.8101) -> (-0.9899, 57.7899)
  line L170 (-0.9899, 57.7899) -> (0.9899, 55.8101) construction
  line L171 (0.9899, 57.7899) -> (-0.9899, 55.8101) construction
  line L172 (-0.9899, 45.8101) -> (0.9899, 45.8101)
  line L173 (0.9899, 45.8101) -> (0.9899, 47.7899)
  line L174 (0.9899, 47.7899) -> (-0.9899, 47.7899)
  line L175 (-0.9899, 47.7899) -> (-0.9899, 45.8101)
  line L176 (-0.9899, 45.8101) -> (0.9899, 47.7899) construction
  line L177 (0.9899, 45.8101) -> (-0.9899, 47.7899) construction
  point P0 (0, 0)
  point P1 (0, 10)
  point P2 (0, 36.8)
  point P3 (0, 46.8)
  point P4 (0, 56.8)
  point P5 (0.8132, 159.1868)
  point P6 (0.8132, 102.3868)
  point P7 (0.8132, 35.9868)
  dimension "d30" = 2.8
  dimension "d32" = 1.9799
  dimension "d33" = 1.9799
hole "Hole1" at (-28.3256, -9.1766, 3.6) at (-22.8132, 170.8132, 3.6) at (-16.1868, 170.8132, 3.6) at (-7.9899, 170.9899, 3.6) at (-1.1868, 170.8132, 3.6) at (0.8132, 159.1868, 3.6) at (0.9899, 134.1899, 3.6) at (0.9899, 122.2101, 3.6) at (0.9899, 114.1899, 3.6) at (0.8132, 102.3868, 3.6) at (0.9899, 67.7899, 3.6) at (0.9899, 55.8101, 3.6) at (0.9899, 47.7899, 3.6) at (0.8132, 35.9868, 3.6) at (0.9899, 10.9899, 3.6) at (-1.0101, -0.9899, 3.6) at (-7.9899, -0.9899, 3.6) at (-16.0101, -0.9899, 3.6) at (-22.9899, -0.9899, 3.6) direction (0, 0, -1) diameter 2.8 end through all
equation "\"d0\" = wood_thickness"
equation "\"d1\" = wood_thickness"
equation "\"d3\" = tabs_width"
equation "\"d4\" = wood_thickness"
equation "\"d7\" = 0.5 * tabs_width"
equation "\"d8\" = 0.5 * tabs_width"
equation "\"d9\" = screw_diameter"
equation "\"d10\" = 2 * screw_depth"
equation "\"d11\" = screw_nut_width"
equation "\"d12\" = screw_nut_thickness"
equation "\"d20\" = wood_thickness + extra_for_sliding_cover"
equation "\"d21\" = deep_for_sliding_cover"
equation "\"d26\" = d25"
equation "\"d30\" = bit_diameter"
equation "\"d33\" = d32"
equation "\"d34\" = bit_diameter"
equation "\"wood_thickness\" = 3.6"
equation "\"tabs_width\" = 10"
equation "\"screw_diameter\" = 3"
equation "\"screw_depth\" = 13"
equation "\"screw_nut_width\" = 8"
equation "\"screw_nut_thickness\" = 3"
equation "\"extra_for_sliding_cover\" = 0.4"
equation "\"deep_for_sliding_cover\" = 1.8"
equation "\"bit_diameter\" = 2.8"
properties part number "side_bottom"
